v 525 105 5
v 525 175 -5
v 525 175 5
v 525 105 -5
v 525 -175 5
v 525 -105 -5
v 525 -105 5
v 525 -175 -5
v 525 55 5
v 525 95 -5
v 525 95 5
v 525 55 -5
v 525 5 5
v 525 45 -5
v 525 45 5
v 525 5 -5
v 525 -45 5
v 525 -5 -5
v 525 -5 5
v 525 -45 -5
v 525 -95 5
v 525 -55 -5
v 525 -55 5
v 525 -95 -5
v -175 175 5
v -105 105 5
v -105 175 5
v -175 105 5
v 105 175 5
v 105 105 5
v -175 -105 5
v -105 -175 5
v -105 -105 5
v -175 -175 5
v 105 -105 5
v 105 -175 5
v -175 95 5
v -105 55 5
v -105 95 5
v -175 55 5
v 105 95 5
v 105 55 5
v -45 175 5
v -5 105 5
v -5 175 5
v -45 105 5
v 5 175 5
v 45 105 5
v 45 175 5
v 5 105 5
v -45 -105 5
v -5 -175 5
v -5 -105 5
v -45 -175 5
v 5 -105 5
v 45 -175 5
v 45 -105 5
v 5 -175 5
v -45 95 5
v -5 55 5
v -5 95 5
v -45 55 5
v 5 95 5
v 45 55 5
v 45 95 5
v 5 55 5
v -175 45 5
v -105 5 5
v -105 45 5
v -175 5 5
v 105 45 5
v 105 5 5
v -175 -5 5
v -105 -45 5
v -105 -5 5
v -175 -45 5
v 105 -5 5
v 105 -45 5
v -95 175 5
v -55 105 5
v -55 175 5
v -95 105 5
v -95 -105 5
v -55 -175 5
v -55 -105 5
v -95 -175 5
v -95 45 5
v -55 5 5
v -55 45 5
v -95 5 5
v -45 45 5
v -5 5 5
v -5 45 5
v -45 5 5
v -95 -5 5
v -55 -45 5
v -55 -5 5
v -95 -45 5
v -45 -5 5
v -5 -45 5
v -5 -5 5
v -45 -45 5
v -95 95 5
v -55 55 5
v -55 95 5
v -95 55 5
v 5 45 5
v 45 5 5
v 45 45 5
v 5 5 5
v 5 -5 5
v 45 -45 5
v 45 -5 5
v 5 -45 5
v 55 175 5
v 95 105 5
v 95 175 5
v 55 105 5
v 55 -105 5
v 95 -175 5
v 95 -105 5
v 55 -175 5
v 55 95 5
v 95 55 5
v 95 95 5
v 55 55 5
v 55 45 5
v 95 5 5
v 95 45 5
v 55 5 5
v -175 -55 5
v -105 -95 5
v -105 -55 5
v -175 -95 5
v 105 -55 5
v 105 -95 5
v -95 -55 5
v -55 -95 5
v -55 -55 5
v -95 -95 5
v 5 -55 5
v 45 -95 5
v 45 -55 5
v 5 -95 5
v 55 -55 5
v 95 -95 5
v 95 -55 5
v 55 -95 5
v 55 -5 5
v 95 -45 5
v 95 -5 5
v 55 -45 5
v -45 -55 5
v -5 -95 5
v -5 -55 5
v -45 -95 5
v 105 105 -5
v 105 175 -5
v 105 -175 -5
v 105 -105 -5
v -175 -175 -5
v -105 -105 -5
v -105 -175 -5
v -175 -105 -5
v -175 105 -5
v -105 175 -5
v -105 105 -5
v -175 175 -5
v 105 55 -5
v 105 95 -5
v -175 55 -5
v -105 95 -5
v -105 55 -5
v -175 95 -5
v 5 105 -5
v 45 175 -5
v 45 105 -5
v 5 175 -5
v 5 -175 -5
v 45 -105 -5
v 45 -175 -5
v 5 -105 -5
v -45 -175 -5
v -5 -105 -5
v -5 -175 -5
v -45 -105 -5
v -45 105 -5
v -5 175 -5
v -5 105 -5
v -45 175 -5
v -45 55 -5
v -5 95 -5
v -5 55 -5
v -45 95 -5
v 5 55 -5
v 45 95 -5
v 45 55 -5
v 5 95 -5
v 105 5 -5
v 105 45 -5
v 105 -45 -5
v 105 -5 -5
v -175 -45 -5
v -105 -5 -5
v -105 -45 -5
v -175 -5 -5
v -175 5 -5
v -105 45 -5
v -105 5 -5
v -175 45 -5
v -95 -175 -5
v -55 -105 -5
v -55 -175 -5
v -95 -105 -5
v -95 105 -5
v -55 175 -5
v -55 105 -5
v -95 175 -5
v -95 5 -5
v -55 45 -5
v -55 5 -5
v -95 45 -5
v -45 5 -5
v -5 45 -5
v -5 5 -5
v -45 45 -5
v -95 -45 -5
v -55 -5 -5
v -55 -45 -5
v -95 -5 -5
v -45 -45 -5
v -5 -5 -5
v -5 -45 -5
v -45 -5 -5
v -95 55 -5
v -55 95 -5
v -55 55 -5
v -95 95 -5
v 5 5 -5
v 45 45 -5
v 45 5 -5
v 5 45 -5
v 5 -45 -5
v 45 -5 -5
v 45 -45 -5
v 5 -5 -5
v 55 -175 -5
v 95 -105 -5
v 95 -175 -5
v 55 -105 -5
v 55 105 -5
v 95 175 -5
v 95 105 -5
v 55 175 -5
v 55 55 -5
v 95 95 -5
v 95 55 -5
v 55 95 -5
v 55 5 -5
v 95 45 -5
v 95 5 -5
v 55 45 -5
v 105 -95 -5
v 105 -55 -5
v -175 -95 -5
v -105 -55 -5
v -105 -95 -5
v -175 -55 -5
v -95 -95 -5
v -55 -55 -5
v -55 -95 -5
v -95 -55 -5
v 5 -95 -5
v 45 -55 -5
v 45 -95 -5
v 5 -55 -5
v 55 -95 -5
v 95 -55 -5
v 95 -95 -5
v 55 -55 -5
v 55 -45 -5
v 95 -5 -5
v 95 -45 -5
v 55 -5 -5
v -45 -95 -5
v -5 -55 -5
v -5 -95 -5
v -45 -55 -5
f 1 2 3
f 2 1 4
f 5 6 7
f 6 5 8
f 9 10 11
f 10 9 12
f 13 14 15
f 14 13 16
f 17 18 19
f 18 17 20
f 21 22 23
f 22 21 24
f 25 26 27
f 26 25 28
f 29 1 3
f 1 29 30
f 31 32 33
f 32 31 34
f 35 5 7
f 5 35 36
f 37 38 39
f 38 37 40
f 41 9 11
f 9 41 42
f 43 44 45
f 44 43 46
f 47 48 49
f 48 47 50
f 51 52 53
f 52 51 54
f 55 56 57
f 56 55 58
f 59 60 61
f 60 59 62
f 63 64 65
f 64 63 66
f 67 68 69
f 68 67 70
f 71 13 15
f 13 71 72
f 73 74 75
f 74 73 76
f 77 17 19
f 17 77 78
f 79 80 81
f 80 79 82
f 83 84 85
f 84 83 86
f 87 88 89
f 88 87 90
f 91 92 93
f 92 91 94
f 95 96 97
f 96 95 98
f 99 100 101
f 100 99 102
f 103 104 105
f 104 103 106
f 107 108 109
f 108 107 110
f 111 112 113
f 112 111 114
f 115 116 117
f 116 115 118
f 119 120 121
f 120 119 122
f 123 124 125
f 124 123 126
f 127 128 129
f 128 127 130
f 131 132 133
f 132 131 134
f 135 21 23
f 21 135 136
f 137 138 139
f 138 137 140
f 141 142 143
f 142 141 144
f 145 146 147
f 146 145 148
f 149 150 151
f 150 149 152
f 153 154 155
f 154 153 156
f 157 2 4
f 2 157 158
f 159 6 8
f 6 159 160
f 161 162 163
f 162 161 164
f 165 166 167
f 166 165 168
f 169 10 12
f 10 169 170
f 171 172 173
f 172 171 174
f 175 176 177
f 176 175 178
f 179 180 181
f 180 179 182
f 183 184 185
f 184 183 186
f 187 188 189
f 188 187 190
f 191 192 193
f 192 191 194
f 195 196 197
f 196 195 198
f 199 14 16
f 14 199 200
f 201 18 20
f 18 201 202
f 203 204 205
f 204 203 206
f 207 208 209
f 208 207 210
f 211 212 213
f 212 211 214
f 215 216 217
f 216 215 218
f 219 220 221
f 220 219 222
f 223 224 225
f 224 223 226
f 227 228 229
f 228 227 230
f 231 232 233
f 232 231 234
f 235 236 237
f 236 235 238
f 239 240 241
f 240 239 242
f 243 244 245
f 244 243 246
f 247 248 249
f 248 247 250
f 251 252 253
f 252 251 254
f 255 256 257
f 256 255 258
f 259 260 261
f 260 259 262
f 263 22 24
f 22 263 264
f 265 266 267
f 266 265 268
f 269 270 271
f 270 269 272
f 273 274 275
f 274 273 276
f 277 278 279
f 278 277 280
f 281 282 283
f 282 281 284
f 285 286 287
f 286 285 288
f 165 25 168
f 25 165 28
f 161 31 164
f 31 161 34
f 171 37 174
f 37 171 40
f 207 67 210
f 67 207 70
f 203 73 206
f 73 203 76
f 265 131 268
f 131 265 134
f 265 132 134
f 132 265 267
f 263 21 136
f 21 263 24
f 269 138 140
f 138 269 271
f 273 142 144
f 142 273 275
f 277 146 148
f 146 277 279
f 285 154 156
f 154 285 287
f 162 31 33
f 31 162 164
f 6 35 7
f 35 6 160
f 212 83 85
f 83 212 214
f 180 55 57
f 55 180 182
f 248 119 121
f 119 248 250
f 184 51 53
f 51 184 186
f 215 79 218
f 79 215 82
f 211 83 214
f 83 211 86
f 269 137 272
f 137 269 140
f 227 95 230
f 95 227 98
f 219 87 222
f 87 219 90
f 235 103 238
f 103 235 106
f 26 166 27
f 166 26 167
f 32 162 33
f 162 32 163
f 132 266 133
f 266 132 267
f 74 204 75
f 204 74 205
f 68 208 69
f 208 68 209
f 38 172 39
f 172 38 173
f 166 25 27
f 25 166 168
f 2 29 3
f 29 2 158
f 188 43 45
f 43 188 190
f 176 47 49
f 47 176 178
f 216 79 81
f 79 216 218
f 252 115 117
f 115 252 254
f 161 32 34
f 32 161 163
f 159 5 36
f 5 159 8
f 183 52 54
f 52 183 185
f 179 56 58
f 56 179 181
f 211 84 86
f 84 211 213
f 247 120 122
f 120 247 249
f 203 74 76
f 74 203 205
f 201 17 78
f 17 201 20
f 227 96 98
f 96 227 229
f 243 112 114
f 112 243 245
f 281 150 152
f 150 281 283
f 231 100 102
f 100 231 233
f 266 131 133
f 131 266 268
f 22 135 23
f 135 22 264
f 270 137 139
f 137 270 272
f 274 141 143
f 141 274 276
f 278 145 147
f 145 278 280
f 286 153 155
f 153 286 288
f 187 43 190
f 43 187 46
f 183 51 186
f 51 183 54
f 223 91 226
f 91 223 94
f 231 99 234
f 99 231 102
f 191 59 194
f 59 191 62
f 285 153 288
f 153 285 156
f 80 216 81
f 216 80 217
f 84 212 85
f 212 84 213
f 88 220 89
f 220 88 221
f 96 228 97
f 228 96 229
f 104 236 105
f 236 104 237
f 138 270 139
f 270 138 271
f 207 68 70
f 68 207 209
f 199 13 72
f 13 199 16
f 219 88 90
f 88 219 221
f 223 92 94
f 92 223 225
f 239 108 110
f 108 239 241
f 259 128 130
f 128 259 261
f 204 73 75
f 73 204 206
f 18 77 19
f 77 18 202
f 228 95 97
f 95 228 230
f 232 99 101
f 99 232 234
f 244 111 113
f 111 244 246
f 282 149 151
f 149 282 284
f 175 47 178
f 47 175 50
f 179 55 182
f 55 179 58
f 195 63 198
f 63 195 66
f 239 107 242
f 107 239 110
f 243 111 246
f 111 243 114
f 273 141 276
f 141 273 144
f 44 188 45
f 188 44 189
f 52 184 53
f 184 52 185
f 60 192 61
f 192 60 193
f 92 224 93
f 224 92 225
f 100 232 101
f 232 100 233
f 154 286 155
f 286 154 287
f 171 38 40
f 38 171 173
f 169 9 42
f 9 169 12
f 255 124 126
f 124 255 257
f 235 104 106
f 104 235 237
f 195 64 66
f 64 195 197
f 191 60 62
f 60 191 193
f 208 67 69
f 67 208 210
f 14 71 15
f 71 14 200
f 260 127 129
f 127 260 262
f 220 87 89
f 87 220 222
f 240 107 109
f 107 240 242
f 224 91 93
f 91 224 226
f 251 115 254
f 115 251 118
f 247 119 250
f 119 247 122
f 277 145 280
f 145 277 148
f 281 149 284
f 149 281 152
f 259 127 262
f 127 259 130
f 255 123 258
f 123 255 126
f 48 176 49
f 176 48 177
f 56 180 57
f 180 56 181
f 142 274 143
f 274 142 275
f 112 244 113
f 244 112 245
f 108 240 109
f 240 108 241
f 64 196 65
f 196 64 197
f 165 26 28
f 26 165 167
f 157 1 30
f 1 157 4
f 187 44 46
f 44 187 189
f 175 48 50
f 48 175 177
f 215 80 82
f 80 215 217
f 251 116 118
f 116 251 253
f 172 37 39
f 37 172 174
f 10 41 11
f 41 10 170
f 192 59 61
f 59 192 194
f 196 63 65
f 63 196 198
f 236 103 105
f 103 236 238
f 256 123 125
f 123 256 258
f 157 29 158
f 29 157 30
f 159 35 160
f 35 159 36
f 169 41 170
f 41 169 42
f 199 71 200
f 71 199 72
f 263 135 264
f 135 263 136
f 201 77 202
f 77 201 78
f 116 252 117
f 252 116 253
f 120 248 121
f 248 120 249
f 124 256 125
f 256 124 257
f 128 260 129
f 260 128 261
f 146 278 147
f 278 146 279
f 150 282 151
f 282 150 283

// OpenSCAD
// OpenSCAD file
// Side of the cage
difference() {
  translate([175, 0, 0]) cube([700, 350, 10], center = true);
  for (i = [-2:2]) {
    translate([175, i * 50, 0]) cube([700, 10, 10], center = true);
    translate([i * 50, 0, 0]) cube([10, 350, 10], center = true);
  }
  translate([-175, 0, 5]) cylinder(h = 10, r = 3, $fn = 100);
  translate([175, 0, 5]) cylinder(h = 10, r = 3, $fn = 100);
}
